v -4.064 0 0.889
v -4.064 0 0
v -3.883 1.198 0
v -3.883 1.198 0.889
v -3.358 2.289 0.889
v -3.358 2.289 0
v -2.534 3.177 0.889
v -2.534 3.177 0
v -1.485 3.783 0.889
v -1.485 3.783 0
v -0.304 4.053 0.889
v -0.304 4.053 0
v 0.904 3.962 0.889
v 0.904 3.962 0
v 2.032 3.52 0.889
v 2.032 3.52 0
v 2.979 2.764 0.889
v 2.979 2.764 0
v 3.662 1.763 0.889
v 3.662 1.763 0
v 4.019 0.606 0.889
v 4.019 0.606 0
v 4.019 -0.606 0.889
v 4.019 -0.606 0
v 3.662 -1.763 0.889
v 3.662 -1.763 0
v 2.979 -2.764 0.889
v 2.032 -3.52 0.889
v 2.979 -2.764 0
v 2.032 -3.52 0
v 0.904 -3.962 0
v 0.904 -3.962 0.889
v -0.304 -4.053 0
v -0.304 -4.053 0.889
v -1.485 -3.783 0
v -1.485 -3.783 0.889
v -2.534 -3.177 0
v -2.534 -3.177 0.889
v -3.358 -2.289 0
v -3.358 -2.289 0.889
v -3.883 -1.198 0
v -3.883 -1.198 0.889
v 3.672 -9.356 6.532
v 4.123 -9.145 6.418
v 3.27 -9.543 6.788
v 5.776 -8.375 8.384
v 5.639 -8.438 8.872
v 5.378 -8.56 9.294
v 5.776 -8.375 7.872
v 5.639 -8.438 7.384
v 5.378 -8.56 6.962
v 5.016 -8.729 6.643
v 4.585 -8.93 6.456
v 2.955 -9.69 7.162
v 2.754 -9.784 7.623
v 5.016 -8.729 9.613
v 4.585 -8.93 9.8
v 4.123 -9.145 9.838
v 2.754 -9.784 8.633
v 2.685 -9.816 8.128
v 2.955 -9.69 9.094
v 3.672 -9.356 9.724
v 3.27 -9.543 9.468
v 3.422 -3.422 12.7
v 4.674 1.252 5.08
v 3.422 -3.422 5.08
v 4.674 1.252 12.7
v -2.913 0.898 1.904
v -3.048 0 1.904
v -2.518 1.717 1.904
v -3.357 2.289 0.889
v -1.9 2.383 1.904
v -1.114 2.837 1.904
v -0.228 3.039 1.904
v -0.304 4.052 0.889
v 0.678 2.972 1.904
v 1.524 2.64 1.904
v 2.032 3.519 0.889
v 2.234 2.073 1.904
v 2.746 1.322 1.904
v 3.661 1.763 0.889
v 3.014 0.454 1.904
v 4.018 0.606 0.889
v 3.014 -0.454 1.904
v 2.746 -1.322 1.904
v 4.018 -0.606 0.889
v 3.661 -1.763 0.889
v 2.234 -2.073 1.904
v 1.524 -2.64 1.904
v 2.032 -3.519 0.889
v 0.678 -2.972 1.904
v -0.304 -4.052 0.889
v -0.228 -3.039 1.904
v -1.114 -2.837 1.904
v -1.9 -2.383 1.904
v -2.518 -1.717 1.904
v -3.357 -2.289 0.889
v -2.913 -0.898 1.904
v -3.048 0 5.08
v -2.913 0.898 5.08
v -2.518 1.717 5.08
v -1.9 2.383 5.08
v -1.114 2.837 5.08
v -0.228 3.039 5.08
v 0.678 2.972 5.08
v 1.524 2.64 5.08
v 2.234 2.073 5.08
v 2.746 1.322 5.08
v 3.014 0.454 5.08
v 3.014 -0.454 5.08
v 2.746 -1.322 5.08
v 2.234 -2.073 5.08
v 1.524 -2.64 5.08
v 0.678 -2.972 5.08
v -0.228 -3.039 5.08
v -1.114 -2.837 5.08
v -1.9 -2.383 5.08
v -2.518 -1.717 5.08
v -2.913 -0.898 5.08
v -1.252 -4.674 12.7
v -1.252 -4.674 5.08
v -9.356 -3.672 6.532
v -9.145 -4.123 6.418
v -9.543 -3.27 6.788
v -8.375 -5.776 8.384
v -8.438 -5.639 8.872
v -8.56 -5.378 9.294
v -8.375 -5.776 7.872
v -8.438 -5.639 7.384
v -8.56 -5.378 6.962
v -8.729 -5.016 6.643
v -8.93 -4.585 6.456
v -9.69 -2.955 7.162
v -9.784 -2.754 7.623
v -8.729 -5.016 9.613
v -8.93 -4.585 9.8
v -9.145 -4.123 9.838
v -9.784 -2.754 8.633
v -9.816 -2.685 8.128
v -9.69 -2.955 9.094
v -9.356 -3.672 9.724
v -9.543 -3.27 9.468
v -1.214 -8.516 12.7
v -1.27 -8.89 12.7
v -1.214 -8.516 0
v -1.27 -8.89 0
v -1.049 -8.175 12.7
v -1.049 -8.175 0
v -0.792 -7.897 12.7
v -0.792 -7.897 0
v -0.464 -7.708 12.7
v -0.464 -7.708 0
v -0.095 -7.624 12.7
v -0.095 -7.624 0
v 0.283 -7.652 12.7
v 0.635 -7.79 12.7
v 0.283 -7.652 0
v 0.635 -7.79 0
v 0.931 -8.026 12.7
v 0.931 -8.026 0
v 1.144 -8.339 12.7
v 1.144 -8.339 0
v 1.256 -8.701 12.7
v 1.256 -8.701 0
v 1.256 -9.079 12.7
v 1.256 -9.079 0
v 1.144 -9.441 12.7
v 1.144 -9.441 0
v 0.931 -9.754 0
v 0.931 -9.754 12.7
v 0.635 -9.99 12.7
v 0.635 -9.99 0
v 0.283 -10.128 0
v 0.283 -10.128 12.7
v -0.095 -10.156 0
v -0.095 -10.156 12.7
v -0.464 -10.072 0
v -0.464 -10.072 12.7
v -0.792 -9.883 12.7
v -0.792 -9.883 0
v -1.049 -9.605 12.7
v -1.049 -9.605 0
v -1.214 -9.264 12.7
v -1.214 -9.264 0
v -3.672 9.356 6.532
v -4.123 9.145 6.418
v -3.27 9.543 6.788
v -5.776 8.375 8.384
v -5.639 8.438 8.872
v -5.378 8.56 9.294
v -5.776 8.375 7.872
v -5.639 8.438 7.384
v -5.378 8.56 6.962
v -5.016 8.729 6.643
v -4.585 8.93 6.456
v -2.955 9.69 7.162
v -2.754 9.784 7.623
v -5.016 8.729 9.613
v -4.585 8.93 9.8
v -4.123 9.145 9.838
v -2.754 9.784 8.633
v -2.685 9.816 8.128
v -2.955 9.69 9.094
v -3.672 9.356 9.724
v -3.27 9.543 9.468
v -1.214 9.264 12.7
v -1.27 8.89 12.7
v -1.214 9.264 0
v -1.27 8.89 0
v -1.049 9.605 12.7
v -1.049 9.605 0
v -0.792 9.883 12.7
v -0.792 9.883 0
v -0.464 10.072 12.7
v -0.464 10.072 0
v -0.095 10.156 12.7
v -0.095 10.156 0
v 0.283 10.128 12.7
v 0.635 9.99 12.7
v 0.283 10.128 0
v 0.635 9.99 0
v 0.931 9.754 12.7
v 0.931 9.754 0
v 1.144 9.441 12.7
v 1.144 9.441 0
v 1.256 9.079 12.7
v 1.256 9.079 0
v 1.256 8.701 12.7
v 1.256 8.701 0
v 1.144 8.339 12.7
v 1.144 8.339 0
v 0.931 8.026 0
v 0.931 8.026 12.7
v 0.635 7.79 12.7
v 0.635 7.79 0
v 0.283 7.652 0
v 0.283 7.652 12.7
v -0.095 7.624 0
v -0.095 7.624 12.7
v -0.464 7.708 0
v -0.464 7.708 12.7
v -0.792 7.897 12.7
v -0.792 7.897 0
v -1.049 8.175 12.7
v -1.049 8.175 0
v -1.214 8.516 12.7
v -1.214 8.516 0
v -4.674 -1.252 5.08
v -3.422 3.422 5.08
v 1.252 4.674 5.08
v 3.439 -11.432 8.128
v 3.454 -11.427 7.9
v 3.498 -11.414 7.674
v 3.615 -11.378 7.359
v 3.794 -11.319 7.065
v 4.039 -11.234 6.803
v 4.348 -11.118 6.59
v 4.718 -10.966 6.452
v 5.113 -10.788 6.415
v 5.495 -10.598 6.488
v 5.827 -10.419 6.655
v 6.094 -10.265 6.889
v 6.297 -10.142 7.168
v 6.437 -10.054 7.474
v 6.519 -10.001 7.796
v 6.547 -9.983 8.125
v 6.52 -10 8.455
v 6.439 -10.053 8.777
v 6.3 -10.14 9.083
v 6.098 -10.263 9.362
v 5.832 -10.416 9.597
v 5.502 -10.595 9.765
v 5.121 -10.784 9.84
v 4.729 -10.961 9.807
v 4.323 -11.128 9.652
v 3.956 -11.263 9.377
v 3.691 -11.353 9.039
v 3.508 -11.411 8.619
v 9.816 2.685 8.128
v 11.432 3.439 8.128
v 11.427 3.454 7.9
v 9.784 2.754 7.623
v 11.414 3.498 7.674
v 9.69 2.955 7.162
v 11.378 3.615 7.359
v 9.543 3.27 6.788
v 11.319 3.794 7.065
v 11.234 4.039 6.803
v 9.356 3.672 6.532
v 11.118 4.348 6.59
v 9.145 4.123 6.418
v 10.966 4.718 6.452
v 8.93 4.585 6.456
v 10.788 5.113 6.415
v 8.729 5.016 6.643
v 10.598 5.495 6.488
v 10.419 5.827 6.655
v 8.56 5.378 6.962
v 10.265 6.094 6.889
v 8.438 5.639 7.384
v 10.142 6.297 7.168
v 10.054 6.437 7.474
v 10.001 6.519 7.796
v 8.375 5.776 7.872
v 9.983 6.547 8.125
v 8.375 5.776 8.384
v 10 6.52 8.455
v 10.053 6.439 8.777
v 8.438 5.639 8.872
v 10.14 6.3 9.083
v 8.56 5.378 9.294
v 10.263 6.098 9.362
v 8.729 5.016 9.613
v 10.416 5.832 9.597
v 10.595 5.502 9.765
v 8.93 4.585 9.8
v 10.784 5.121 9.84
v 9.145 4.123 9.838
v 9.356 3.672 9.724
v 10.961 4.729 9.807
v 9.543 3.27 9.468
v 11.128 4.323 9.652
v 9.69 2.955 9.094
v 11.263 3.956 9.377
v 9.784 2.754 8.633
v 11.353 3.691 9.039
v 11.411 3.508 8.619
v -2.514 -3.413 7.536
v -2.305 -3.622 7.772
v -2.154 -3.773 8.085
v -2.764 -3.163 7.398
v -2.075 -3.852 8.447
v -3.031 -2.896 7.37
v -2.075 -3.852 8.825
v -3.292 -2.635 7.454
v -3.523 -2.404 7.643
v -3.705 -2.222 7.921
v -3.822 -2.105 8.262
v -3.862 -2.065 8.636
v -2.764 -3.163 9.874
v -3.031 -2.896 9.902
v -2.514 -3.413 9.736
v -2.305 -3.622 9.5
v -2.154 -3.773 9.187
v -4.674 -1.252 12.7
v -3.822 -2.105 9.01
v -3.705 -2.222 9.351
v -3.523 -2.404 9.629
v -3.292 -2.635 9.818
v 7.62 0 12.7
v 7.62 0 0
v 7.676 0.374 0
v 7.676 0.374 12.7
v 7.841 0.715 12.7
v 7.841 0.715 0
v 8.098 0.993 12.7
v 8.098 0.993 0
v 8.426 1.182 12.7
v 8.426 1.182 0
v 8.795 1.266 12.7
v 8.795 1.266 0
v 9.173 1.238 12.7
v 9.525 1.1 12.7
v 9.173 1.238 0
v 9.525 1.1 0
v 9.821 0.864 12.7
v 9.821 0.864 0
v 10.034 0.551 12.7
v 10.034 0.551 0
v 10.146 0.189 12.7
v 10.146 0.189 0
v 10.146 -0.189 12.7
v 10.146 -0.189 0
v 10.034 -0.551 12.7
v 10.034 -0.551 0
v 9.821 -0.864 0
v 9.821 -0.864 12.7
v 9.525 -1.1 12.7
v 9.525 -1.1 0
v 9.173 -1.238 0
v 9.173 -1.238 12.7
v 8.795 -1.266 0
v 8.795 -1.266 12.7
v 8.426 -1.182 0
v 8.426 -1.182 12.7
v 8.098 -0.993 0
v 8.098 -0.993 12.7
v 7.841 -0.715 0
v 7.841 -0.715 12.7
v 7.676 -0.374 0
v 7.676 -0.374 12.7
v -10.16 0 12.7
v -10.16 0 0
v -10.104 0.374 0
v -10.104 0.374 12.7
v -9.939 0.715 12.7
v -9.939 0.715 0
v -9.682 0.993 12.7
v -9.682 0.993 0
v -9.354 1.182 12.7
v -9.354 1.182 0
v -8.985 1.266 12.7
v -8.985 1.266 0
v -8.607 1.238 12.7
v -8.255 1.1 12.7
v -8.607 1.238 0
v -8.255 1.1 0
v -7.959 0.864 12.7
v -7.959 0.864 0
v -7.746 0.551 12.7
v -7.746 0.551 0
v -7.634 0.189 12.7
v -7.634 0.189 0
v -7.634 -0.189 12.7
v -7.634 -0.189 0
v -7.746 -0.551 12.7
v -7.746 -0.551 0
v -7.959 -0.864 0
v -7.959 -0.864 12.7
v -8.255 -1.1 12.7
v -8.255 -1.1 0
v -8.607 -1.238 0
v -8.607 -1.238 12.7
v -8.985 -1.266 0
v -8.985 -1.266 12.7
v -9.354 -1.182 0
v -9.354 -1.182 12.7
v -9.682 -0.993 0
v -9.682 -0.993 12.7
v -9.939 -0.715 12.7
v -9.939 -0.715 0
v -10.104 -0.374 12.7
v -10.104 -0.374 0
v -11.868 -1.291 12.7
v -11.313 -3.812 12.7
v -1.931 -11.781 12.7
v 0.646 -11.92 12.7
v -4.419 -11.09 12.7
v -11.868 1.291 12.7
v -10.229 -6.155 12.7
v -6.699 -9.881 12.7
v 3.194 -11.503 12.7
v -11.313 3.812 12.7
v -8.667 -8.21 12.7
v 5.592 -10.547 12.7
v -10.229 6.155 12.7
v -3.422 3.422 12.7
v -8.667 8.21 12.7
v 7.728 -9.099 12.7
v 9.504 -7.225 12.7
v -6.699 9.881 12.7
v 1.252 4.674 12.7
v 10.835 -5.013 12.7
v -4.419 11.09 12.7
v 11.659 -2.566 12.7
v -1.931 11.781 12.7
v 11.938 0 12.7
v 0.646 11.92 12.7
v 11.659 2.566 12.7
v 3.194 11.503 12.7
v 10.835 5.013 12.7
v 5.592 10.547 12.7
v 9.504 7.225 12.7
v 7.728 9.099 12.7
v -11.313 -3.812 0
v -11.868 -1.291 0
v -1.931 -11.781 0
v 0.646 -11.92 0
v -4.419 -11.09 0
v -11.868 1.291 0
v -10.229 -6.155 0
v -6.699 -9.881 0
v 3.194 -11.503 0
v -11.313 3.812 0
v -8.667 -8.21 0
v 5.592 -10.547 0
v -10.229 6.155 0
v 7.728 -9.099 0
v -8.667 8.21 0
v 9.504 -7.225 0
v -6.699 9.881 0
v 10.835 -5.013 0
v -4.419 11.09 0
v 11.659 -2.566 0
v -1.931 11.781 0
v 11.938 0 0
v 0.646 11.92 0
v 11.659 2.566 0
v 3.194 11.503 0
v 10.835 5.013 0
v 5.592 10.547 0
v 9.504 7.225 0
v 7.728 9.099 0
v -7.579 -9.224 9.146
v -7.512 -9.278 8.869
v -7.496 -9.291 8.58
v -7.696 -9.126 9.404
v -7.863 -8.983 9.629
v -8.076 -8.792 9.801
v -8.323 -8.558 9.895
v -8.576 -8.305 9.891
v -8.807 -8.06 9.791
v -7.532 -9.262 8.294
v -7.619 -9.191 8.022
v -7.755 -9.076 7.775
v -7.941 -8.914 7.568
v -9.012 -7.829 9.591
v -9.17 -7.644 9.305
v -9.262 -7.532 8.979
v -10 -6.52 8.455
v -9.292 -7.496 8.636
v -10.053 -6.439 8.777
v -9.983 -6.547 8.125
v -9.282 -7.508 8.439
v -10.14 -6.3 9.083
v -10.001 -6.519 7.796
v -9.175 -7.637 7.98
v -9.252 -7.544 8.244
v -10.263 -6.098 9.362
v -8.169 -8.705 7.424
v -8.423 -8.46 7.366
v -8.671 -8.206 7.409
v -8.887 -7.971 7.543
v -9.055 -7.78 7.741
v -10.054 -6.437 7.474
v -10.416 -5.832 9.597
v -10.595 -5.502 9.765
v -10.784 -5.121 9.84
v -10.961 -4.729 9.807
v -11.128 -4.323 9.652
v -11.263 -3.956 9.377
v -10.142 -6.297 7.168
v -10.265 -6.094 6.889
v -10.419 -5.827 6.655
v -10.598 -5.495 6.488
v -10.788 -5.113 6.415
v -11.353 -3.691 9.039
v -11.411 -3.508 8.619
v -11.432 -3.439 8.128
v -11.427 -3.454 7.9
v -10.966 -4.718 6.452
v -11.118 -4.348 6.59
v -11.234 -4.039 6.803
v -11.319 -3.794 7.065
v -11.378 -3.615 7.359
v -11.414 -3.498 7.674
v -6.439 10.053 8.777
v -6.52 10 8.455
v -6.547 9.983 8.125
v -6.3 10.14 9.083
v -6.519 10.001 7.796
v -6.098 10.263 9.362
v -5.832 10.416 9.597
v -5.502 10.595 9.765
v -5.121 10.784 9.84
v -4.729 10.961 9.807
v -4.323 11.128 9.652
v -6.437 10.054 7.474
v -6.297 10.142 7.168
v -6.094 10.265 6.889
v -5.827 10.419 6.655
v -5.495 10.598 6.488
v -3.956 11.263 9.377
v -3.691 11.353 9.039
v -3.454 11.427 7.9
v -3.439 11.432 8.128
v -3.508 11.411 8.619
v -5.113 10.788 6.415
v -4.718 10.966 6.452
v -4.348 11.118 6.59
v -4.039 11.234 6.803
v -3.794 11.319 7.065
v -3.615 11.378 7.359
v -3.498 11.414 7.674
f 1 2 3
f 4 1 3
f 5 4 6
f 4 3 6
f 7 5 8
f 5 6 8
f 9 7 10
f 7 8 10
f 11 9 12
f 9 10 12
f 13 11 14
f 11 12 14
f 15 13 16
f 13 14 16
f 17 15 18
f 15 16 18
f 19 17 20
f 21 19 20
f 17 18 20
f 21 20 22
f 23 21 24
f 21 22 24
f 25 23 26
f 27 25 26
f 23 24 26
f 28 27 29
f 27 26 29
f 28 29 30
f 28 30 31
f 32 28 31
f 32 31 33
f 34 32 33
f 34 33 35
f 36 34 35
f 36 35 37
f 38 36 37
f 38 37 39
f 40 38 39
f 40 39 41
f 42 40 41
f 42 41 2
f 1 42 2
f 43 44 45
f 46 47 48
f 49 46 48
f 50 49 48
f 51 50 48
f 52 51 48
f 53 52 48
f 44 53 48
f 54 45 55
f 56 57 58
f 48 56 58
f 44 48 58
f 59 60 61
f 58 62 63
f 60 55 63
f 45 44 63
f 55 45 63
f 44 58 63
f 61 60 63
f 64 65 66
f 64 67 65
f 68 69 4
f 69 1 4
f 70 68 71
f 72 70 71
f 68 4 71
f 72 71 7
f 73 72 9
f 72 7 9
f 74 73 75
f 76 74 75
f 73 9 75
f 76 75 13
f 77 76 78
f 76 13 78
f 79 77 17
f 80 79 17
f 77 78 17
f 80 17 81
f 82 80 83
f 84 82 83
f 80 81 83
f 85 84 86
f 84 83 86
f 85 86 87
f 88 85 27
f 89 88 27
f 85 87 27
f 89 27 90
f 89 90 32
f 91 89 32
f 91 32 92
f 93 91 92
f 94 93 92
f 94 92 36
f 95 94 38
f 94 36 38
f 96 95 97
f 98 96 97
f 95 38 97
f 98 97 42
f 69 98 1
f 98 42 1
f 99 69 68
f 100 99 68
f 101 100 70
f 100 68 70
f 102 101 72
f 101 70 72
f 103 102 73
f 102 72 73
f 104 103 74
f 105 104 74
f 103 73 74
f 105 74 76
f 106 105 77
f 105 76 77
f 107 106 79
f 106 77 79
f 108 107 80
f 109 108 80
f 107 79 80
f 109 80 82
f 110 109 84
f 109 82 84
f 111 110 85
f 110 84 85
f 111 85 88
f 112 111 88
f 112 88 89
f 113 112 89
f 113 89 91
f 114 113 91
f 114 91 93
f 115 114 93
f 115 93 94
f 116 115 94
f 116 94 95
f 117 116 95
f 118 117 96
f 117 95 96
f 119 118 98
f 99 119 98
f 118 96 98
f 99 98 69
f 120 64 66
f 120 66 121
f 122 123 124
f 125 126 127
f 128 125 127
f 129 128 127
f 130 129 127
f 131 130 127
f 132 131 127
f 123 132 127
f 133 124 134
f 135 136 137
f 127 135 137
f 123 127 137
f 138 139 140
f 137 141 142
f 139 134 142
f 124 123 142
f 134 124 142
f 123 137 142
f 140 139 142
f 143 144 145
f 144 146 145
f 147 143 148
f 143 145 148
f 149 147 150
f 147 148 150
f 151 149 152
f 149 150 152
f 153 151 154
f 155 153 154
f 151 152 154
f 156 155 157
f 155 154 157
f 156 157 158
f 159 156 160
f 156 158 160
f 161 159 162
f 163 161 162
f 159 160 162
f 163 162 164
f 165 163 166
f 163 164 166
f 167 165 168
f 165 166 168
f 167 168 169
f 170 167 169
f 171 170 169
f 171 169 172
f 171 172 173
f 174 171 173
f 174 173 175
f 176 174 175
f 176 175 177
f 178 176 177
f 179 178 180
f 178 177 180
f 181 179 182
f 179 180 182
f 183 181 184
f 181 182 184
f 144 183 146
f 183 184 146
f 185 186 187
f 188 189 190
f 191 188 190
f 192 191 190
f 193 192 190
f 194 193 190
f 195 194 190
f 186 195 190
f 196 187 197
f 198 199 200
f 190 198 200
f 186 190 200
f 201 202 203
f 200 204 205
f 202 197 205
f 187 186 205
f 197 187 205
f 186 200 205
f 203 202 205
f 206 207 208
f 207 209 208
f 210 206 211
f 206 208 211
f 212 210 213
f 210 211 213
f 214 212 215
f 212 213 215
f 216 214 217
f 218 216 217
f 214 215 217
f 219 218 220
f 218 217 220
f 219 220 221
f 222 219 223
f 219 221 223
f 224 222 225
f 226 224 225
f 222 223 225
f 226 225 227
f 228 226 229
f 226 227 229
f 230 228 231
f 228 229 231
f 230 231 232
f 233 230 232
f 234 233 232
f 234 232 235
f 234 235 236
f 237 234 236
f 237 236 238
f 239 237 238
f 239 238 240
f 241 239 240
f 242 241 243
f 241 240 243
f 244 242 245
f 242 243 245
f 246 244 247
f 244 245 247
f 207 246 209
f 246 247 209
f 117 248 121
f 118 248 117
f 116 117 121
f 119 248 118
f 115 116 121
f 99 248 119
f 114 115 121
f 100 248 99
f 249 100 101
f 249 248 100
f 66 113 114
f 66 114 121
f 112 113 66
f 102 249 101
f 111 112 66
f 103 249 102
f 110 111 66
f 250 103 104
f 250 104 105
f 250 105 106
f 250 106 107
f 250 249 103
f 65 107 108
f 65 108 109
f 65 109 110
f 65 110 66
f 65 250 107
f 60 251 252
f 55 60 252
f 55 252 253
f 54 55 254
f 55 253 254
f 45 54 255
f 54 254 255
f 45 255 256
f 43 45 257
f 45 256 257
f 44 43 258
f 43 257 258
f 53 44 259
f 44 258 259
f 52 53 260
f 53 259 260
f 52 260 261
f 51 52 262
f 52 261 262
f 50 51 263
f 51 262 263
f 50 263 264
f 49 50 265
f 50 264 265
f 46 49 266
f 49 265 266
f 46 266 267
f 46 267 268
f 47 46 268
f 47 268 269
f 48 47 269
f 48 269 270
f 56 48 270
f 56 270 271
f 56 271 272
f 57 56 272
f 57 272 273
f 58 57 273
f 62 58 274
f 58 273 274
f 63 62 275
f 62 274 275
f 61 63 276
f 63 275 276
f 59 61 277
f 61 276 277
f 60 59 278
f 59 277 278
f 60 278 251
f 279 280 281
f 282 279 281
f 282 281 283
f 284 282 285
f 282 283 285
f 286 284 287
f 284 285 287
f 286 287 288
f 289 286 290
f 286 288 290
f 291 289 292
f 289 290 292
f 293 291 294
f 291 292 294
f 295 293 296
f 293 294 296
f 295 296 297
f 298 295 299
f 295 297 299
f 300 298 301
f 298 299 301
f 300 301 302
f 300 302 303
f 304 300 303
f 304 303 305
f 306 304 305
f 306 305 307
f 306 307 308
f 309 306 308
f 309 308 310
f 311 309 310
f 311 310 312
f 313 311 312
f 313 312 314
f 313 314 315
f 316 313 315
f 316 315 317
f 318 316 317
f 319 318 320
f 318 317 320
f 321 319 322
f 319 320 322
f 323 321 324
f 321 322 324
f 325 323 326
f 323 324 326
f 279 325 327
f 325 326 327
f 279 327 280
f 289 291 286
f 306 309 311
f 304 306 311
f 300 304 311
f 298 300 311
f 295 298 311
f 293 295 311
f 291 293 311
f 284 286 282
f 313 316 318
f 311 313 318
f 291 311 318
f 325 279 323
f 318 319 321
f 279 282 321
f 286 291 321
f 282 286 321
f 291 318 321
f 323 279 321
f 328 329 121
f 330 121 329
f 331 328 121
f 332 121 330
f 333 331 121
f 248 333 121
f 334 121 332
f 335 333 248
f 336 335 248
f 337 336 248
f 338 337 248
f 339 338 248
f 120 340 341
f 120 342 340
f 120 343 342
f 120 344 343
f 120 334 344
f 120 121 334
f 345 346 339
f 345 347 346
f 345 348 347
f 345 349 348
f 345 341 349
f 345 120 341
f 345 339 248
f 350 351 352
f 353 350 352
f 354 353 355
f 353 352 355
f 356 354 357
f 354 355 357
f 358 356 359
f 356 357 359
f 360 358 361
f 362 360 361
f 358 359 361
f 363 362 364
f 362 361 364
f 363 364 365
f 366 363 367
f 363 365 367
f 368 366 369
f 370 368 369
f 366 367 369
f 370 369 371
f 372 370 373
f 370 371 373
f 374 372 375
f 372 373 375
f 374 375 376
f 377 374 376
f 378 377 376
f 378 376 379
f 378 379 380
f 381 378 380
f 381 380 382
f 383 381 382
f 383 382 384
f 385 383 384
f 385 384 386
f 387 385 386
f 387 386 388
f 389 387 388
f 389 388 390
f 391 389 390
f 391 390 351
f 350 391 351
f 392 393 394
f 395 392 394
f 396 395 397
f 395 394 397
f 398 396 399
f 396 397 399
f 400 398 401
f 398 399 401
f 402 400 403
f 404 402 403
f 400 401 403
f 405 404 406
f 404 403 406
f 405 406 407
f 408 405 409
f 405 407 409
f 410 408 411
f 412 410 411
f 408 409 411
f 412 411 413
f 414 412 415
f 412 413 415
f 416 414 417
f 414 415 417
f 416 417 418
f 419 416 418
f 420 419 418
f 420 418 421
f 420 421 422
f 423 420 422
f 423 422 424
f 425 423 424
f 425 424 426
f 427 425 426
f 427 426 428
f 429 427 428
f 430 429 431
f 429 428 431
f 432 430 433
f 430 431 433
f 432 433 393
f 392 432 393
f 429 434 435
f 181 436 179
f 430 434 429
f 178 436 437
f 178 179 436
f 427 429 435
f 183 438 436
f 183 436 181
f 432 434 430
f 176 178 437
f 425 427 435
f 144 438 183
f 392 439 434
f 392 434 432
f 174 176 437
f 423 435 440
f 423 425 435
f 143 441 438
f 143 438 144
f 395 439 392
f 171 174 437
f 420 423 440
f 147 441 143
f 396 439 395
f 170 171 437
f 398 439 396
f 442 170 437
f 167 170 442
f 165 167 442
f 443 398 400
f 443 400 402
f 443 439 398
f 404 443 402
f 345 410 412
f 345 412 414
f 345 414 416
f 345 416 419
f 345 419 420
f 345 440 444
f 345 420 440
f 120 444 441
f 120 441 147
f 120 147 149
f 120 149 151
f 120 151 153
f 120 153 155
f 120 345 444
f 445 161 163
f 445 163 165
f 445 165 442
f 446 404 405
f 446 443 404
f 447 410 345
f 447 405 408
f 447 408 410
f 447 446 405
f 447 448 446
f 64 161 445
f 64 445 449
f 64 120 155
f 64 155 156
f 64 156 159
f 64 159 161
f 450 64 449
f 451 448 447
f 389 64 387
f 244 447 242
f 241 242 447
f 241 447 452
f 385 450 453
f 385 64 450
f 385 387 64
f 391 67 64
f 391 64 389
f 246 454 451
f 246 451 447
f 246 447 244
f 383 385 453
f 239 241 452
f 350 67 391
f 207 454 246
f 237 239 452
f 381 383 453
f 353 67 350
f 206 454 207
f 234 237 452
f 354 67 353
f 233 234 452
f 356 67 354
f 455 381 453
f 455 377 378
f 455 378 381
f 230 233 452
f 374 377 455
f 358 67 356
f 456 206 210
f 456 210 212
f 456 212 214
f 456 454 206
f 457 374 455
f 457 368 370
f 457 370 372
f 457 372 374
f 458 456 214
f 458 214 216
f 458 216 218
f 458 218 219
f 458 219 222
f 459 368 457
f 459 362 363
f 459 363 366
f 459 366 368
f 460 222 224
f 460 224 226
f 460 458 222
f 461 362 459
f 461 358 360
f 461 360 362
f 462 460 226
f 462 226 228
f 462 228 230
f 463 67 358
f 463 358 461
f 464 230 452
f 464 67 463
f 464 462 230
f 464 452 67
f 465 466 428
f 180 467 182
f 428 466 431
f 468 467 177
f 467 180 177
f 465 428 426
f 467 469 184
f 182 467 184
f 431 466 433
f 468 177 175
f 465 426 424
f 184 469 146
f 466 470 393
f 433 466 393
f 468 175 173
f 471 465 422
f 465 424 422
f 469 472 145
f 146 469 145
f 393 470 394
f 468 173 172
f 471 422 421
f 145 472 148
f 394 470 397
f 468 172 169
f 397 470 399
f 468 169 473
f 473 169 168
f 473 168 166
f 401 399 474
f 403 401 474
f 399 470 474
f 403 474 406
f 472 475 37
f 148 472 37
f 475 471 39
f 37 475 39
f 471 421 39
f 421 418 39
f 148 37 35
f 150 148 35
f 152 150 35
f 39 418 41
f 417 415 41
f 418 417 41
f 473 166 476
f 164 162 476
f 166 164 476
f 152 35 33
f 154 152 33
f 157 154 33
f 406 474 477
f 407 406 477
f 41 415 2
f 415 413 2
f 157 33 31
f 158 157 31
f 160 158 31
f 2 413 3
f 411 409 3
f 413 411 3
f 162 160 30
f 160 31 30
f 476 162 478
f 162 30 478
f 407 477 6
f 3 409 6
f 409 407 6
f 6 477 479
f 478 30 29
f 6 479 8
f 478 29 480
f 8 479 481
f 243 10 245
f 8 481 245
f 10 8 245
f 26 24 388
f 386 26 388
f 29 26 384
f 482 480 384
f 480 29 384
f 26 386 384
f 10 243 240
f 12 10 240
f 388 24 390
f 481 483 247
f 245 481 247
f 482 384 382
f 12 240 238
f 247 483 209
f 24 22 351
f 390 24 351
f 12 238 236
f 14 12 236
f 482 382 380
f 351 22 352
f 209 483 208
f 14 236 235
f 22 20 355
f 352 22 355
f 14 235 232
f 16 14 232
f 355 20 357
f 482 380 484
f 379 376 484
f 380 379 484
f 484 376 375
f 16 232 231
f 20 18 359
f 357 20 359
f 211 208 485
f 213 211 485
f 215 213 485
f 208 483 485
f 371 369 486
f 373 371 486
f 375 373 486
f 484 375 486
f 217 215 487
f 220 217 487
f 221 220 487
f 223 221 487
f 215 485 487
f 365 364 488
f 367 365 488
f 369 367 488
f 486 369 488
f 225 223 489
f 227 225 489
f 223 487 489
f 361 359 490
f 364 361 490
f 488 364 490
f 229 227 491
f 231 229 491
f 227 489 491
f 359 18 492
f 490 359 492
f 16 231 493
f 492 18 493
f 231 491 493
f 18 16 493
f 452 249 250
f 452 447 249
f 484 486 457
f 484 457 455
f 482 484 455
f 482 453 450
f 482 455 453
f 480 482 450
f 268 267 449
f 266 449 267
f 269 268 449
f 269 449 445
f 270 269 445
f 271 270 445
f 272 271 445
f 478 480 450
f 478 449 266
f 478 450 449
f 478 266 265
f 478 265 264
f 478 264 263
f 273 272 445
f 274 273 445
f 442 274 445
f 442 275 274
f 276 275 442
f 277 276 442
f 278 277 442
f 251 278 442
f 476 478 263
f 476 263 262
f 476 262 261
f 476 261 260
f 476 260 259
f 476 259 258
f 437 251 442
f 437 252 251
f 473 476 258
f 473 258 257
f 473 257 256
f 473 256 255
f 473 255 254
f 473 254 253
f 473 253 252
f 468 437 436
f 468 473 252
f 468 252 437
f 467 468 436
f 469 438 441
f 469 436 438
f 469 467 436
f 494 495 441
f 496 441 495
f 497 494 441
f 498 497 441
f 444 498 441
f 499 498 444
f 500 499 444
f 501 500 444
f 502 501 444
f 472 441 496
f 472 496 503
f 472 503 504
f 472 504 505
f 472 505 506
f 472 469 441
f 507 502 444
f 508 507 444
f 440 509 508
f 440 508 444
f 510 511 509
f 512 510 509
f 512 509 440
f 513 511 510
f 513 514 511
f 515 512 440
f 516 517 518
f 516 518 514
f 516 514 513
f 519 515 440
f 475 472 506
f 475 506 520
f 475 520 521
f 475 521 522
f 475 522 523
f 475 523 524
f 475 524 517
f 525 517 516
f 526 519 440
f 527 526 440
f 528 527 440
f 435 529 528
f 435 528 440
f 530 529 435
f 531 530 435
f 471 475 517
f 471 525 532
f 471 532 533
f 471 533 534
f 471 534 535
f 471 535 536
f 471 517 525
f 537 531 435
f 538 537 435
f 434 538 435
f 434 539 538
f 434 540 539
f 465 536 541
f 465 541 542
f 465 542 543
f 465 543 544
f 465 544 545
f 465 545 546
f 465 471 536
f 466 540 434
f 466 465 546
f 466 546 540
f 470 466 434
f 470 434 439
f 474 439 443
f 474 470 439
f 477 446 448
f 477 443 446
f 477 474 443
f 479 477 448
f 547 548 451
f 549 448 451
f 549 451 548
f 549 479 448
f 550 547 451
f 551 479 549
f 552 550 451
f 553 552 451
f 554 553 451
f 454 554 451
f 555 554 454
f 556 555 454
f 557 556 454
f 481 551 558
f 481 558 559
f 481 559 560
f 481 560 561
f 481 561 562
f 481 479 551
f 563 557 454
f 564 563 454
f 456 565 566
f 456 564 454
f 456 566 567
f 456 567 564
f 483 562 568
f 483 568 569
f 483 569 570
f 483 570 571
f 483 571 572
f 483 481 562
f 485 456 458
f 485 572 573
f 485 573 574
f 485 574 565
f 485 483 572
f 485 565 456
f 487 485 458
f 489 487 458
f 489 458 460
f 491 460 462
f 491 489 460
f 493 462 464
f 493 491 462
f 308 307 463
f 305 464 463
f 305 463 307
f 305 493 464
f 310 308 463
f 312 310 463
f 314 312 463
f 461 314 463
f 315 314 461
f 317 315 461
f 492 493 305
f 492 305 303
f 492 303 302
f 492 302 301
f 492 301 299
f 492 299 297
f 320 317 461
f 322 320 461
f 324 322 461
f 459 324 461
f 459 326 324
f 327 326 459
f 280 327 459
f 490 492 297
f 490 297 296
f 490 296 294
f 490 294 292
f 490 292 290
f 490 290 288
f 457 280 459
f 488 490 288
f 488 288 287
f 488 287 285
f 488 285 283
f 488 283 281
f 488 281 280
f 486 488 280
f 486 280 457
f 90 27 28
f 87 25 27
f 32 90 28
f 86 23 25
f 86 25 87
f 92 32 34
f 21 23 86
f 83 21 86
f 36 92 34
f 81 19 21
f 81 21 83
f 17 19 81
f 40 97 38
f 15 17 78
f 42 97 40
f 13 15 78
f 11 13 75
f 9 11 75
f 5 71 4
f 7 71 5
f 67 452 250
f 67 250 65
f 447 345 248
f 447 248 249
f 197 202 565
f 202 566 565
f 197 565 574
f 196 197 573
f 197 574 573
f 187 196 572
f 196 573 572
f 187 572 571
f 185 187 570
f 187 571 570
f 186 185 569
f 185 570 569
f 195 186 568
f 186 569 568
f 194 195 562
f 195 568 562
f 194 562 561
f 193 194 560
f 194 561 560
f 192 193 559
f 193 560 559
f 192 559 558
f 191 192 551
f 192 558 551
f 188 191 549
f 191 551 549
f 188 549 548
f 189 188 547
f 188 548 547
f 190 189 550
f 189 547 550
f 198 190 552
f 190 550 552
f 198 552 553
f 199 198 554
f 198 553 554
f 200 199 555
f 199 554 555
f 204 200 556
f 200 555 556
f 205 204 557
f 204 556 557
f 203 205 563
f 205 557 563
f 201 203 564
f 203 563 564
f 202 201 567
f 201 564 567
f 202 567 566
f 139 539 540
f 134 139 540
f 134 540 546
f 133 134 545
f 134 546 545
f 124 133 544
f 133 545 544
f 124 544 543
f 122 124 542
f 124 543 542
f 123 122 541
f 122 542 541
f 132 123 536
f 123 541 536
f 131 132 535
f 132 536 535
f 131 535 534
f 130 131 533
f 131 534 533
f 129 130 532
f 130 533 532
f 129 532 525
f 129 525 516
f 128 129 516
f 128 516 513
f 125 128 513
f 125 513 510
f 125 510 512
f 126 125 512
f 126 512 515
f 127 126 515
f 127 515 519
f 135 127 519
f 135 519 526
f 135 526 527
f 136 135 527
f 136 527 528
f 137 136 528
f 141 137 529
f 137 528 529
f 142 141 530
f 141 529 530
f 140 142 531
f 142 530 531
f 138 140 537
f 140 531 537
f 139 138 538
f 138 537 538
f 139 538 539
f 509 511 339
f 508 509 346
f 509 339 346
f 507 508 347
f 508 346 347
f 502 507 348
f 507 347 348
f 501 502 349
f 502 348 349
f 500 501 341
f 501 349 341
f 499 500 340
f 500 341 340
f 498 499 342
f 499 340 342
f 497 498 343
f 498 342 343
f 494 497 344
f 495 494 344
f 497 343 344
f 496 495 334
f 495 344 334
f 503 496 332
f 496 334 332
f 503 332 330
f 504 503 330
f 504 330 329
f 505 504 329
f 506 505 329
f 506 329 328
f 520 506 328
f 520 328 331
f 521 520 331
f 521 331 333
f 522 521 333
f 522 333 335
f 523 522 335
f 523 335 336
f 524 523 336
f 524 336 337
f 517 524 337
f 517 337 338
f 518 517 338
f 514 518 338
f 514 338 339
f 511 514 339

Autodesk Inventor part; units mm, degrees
ref_plane "XZ Plane" through (0, 0, 0) normal (0, 1, 0) x (-1, 0, 0)
ref_plane "XY Plane" through (0, 0, 0) normal (0, 0, 1) x (1, 0, 0)
sketch "Sketch1" plane through (0, 0, 0) normal (0, 0, 1) x (1, 0, 0)
  circle A0 centre (0, 0) radius 11.938
  dimension "d0" = 23.876
extrude "Extrusion1" add sketch "Sketch1" along normal blind 12.7
sketch "Sketch3" plane through (0, 0, 0) normal (0, 0, -1) x (-1, 0, 0)
  circle A0 centre (8.89, 0) radius 1.27
  circle A1 centre (0, 8.89) radius 1.27
  circle A2 centre (-8.89, 0) radius 1.27
  circle A3 centre (0, -8.89) radius 1.27
  point P0 (0, 0)
  dimension "d3" = 2.54
  dimension "d4" = 8.89
  dimension "d7" = 360
extrude "Extrusion2" cut sketch "Sketch3" against normal through all
sketch "Sketch4" plane through (0, 0, 12.7) normal (0, 0, 1) x (1, 0, 0)
  line L0 (4.6745, 1.2525) -> (3.4219, -3.4219)
  line L1 (3.4219, -3.4219) -> (-1.2525, -4.6745)
  line L2 (-1.2525, -4.6745) -> (-4.6745, -1.2525)
  line L3 (-4.6745, -1.2525) -> (-3.4219, 3.4219)
  line L4 (-3.4219, 3.4219) -> (1.2525, 4.6745)
  line L5 (1.2525, 4.6745) -> (4.6745, 1.2525)
  circle A0 centre (8.89, 0) radius 1.27 projected
  circle A1 centre (-8.89, 0) radius 1.27 projected
  circle A2 centre (0, 8.89) radius 1.27 projected
  circle A3 centre (0, -8.89) radius 1.27 projected
  circle A4 centre (0, 0) radius 11.938 projected
  line L6 (-2.9635, -2.9635) -> (-8.4414, -8.4414) construction
  circle A5 centre (0, 0) radius 11.938 construction
  line L7 (-8.89, 0) -> (-8.4414, -8.4414) construction
  line L8 (0, -8.89) -> (-8.4414, -8.4414) construction
  dimension "d11" = 8.382
extrude "Extrusion3" cut sketch "Sketch4" against normal blind 7.62 contours L0 L1 L2 L3 L4 L5
sketch "Sketch5" plane through (0, 0, 0) normal (0, 0, -1) x (-1, 0, 0)
  circle A0 centre (0, 0) radius 3.048
  dimension "d14" = 6.096
extrude "Extrusion4" cut sketch "Sketch5" against normal through all
sketch "Sketch7" plane through (-1.2525, -4.6745, 5.08) normal (0.7071, 0.7071, 0) x (-0.7071, 0.7071, 0)
  circle A0 centre (2.4197, 3.556) radius 1.27
  line L0 (14.3577, 7.62) -> (-9.5183, 7.62) projected
  line L1 (13.5978, 7.62) -> (13.5978, -5.08) construction
  line L2 (13.5978, -5.08) -> (-8.7585, -5.08) construction
  line L3 (-8.7585, -5.08) -> (-8.7585, 7.62) construction
  line L4 (-8.7585, 7.62) -> (0, 7.62) construction
  line L5 (0, 7.62) -> (4.8393, 7.62) construction
  line L6 (4.8393, 7.62) -> (13.5978, 7.62) construction
  line L7 (0, 7.62) -> (0, 0) construction
  line L8 (0, 0) -> (4.8393, 0) construction
  line L9 (4.8393, 0) -> (4.8393, 7.62) construction
  line L10 (13.5978, 7.62) -> (2.4197, 3.556) construction
  line L11 (2.4197, 3.556) -> (-8.7585, 7.62) construction
  point P0 (2.4197, -5.08)
  dimension "d22" = 4.064
  dimension "d39" = 2.54
extrude "Extrusion6" cut sketch "Sketch7" against normal through all
sketch "Sketch8" plane through (0, 0, 0) normal (0, 0, -1) x (-1, 0, 0)
  circle A0 centre (0, 0) radius 4.064
  dimension "d25" = 8.128
extrude "Extrusion7" cut sketch "Sketch8" against normal blind 0.889
chamfer "Chamfer1" distance 1.016 angle 45 1 edges at (3.048, 0, 0.889)
ref_plane "Work Plane2" through (-10.8195, -5.0452, 0) normal (0.9063, 0.4226, 0) x (-0.4226, 0.9063, 0)
ref_plane "Work Plane1" through (0, 0, 0) normal (0.9063, 0.4226, 0) x (0, 0, 1)
sketch "Sketch9" plane through (-10.8195, -5.0452, 0) normal (0.9063, 0.4226, 0) x (-0.4226, 0.9063, 0)
  circle A0 centre (0, 8.128) radius 1.7145
  line L0 (11.938, 12.7) -> (-11.938, 12.7) projected
  point P0 (0, 0)
  dimension "d32" = 3.429
  dimension "d33" = 4.572
extrude "Extrusion8" cut sketch "Sketch9" along normal blind 1.905
pattern_circular "Circular Pattern1" count 4 over 360 about axis through (0, 0, 0) along (0, 0, 1) of "Extrusion8"
properties part number "HexNutShaftServoCoupler" material "ABS Plastic"
